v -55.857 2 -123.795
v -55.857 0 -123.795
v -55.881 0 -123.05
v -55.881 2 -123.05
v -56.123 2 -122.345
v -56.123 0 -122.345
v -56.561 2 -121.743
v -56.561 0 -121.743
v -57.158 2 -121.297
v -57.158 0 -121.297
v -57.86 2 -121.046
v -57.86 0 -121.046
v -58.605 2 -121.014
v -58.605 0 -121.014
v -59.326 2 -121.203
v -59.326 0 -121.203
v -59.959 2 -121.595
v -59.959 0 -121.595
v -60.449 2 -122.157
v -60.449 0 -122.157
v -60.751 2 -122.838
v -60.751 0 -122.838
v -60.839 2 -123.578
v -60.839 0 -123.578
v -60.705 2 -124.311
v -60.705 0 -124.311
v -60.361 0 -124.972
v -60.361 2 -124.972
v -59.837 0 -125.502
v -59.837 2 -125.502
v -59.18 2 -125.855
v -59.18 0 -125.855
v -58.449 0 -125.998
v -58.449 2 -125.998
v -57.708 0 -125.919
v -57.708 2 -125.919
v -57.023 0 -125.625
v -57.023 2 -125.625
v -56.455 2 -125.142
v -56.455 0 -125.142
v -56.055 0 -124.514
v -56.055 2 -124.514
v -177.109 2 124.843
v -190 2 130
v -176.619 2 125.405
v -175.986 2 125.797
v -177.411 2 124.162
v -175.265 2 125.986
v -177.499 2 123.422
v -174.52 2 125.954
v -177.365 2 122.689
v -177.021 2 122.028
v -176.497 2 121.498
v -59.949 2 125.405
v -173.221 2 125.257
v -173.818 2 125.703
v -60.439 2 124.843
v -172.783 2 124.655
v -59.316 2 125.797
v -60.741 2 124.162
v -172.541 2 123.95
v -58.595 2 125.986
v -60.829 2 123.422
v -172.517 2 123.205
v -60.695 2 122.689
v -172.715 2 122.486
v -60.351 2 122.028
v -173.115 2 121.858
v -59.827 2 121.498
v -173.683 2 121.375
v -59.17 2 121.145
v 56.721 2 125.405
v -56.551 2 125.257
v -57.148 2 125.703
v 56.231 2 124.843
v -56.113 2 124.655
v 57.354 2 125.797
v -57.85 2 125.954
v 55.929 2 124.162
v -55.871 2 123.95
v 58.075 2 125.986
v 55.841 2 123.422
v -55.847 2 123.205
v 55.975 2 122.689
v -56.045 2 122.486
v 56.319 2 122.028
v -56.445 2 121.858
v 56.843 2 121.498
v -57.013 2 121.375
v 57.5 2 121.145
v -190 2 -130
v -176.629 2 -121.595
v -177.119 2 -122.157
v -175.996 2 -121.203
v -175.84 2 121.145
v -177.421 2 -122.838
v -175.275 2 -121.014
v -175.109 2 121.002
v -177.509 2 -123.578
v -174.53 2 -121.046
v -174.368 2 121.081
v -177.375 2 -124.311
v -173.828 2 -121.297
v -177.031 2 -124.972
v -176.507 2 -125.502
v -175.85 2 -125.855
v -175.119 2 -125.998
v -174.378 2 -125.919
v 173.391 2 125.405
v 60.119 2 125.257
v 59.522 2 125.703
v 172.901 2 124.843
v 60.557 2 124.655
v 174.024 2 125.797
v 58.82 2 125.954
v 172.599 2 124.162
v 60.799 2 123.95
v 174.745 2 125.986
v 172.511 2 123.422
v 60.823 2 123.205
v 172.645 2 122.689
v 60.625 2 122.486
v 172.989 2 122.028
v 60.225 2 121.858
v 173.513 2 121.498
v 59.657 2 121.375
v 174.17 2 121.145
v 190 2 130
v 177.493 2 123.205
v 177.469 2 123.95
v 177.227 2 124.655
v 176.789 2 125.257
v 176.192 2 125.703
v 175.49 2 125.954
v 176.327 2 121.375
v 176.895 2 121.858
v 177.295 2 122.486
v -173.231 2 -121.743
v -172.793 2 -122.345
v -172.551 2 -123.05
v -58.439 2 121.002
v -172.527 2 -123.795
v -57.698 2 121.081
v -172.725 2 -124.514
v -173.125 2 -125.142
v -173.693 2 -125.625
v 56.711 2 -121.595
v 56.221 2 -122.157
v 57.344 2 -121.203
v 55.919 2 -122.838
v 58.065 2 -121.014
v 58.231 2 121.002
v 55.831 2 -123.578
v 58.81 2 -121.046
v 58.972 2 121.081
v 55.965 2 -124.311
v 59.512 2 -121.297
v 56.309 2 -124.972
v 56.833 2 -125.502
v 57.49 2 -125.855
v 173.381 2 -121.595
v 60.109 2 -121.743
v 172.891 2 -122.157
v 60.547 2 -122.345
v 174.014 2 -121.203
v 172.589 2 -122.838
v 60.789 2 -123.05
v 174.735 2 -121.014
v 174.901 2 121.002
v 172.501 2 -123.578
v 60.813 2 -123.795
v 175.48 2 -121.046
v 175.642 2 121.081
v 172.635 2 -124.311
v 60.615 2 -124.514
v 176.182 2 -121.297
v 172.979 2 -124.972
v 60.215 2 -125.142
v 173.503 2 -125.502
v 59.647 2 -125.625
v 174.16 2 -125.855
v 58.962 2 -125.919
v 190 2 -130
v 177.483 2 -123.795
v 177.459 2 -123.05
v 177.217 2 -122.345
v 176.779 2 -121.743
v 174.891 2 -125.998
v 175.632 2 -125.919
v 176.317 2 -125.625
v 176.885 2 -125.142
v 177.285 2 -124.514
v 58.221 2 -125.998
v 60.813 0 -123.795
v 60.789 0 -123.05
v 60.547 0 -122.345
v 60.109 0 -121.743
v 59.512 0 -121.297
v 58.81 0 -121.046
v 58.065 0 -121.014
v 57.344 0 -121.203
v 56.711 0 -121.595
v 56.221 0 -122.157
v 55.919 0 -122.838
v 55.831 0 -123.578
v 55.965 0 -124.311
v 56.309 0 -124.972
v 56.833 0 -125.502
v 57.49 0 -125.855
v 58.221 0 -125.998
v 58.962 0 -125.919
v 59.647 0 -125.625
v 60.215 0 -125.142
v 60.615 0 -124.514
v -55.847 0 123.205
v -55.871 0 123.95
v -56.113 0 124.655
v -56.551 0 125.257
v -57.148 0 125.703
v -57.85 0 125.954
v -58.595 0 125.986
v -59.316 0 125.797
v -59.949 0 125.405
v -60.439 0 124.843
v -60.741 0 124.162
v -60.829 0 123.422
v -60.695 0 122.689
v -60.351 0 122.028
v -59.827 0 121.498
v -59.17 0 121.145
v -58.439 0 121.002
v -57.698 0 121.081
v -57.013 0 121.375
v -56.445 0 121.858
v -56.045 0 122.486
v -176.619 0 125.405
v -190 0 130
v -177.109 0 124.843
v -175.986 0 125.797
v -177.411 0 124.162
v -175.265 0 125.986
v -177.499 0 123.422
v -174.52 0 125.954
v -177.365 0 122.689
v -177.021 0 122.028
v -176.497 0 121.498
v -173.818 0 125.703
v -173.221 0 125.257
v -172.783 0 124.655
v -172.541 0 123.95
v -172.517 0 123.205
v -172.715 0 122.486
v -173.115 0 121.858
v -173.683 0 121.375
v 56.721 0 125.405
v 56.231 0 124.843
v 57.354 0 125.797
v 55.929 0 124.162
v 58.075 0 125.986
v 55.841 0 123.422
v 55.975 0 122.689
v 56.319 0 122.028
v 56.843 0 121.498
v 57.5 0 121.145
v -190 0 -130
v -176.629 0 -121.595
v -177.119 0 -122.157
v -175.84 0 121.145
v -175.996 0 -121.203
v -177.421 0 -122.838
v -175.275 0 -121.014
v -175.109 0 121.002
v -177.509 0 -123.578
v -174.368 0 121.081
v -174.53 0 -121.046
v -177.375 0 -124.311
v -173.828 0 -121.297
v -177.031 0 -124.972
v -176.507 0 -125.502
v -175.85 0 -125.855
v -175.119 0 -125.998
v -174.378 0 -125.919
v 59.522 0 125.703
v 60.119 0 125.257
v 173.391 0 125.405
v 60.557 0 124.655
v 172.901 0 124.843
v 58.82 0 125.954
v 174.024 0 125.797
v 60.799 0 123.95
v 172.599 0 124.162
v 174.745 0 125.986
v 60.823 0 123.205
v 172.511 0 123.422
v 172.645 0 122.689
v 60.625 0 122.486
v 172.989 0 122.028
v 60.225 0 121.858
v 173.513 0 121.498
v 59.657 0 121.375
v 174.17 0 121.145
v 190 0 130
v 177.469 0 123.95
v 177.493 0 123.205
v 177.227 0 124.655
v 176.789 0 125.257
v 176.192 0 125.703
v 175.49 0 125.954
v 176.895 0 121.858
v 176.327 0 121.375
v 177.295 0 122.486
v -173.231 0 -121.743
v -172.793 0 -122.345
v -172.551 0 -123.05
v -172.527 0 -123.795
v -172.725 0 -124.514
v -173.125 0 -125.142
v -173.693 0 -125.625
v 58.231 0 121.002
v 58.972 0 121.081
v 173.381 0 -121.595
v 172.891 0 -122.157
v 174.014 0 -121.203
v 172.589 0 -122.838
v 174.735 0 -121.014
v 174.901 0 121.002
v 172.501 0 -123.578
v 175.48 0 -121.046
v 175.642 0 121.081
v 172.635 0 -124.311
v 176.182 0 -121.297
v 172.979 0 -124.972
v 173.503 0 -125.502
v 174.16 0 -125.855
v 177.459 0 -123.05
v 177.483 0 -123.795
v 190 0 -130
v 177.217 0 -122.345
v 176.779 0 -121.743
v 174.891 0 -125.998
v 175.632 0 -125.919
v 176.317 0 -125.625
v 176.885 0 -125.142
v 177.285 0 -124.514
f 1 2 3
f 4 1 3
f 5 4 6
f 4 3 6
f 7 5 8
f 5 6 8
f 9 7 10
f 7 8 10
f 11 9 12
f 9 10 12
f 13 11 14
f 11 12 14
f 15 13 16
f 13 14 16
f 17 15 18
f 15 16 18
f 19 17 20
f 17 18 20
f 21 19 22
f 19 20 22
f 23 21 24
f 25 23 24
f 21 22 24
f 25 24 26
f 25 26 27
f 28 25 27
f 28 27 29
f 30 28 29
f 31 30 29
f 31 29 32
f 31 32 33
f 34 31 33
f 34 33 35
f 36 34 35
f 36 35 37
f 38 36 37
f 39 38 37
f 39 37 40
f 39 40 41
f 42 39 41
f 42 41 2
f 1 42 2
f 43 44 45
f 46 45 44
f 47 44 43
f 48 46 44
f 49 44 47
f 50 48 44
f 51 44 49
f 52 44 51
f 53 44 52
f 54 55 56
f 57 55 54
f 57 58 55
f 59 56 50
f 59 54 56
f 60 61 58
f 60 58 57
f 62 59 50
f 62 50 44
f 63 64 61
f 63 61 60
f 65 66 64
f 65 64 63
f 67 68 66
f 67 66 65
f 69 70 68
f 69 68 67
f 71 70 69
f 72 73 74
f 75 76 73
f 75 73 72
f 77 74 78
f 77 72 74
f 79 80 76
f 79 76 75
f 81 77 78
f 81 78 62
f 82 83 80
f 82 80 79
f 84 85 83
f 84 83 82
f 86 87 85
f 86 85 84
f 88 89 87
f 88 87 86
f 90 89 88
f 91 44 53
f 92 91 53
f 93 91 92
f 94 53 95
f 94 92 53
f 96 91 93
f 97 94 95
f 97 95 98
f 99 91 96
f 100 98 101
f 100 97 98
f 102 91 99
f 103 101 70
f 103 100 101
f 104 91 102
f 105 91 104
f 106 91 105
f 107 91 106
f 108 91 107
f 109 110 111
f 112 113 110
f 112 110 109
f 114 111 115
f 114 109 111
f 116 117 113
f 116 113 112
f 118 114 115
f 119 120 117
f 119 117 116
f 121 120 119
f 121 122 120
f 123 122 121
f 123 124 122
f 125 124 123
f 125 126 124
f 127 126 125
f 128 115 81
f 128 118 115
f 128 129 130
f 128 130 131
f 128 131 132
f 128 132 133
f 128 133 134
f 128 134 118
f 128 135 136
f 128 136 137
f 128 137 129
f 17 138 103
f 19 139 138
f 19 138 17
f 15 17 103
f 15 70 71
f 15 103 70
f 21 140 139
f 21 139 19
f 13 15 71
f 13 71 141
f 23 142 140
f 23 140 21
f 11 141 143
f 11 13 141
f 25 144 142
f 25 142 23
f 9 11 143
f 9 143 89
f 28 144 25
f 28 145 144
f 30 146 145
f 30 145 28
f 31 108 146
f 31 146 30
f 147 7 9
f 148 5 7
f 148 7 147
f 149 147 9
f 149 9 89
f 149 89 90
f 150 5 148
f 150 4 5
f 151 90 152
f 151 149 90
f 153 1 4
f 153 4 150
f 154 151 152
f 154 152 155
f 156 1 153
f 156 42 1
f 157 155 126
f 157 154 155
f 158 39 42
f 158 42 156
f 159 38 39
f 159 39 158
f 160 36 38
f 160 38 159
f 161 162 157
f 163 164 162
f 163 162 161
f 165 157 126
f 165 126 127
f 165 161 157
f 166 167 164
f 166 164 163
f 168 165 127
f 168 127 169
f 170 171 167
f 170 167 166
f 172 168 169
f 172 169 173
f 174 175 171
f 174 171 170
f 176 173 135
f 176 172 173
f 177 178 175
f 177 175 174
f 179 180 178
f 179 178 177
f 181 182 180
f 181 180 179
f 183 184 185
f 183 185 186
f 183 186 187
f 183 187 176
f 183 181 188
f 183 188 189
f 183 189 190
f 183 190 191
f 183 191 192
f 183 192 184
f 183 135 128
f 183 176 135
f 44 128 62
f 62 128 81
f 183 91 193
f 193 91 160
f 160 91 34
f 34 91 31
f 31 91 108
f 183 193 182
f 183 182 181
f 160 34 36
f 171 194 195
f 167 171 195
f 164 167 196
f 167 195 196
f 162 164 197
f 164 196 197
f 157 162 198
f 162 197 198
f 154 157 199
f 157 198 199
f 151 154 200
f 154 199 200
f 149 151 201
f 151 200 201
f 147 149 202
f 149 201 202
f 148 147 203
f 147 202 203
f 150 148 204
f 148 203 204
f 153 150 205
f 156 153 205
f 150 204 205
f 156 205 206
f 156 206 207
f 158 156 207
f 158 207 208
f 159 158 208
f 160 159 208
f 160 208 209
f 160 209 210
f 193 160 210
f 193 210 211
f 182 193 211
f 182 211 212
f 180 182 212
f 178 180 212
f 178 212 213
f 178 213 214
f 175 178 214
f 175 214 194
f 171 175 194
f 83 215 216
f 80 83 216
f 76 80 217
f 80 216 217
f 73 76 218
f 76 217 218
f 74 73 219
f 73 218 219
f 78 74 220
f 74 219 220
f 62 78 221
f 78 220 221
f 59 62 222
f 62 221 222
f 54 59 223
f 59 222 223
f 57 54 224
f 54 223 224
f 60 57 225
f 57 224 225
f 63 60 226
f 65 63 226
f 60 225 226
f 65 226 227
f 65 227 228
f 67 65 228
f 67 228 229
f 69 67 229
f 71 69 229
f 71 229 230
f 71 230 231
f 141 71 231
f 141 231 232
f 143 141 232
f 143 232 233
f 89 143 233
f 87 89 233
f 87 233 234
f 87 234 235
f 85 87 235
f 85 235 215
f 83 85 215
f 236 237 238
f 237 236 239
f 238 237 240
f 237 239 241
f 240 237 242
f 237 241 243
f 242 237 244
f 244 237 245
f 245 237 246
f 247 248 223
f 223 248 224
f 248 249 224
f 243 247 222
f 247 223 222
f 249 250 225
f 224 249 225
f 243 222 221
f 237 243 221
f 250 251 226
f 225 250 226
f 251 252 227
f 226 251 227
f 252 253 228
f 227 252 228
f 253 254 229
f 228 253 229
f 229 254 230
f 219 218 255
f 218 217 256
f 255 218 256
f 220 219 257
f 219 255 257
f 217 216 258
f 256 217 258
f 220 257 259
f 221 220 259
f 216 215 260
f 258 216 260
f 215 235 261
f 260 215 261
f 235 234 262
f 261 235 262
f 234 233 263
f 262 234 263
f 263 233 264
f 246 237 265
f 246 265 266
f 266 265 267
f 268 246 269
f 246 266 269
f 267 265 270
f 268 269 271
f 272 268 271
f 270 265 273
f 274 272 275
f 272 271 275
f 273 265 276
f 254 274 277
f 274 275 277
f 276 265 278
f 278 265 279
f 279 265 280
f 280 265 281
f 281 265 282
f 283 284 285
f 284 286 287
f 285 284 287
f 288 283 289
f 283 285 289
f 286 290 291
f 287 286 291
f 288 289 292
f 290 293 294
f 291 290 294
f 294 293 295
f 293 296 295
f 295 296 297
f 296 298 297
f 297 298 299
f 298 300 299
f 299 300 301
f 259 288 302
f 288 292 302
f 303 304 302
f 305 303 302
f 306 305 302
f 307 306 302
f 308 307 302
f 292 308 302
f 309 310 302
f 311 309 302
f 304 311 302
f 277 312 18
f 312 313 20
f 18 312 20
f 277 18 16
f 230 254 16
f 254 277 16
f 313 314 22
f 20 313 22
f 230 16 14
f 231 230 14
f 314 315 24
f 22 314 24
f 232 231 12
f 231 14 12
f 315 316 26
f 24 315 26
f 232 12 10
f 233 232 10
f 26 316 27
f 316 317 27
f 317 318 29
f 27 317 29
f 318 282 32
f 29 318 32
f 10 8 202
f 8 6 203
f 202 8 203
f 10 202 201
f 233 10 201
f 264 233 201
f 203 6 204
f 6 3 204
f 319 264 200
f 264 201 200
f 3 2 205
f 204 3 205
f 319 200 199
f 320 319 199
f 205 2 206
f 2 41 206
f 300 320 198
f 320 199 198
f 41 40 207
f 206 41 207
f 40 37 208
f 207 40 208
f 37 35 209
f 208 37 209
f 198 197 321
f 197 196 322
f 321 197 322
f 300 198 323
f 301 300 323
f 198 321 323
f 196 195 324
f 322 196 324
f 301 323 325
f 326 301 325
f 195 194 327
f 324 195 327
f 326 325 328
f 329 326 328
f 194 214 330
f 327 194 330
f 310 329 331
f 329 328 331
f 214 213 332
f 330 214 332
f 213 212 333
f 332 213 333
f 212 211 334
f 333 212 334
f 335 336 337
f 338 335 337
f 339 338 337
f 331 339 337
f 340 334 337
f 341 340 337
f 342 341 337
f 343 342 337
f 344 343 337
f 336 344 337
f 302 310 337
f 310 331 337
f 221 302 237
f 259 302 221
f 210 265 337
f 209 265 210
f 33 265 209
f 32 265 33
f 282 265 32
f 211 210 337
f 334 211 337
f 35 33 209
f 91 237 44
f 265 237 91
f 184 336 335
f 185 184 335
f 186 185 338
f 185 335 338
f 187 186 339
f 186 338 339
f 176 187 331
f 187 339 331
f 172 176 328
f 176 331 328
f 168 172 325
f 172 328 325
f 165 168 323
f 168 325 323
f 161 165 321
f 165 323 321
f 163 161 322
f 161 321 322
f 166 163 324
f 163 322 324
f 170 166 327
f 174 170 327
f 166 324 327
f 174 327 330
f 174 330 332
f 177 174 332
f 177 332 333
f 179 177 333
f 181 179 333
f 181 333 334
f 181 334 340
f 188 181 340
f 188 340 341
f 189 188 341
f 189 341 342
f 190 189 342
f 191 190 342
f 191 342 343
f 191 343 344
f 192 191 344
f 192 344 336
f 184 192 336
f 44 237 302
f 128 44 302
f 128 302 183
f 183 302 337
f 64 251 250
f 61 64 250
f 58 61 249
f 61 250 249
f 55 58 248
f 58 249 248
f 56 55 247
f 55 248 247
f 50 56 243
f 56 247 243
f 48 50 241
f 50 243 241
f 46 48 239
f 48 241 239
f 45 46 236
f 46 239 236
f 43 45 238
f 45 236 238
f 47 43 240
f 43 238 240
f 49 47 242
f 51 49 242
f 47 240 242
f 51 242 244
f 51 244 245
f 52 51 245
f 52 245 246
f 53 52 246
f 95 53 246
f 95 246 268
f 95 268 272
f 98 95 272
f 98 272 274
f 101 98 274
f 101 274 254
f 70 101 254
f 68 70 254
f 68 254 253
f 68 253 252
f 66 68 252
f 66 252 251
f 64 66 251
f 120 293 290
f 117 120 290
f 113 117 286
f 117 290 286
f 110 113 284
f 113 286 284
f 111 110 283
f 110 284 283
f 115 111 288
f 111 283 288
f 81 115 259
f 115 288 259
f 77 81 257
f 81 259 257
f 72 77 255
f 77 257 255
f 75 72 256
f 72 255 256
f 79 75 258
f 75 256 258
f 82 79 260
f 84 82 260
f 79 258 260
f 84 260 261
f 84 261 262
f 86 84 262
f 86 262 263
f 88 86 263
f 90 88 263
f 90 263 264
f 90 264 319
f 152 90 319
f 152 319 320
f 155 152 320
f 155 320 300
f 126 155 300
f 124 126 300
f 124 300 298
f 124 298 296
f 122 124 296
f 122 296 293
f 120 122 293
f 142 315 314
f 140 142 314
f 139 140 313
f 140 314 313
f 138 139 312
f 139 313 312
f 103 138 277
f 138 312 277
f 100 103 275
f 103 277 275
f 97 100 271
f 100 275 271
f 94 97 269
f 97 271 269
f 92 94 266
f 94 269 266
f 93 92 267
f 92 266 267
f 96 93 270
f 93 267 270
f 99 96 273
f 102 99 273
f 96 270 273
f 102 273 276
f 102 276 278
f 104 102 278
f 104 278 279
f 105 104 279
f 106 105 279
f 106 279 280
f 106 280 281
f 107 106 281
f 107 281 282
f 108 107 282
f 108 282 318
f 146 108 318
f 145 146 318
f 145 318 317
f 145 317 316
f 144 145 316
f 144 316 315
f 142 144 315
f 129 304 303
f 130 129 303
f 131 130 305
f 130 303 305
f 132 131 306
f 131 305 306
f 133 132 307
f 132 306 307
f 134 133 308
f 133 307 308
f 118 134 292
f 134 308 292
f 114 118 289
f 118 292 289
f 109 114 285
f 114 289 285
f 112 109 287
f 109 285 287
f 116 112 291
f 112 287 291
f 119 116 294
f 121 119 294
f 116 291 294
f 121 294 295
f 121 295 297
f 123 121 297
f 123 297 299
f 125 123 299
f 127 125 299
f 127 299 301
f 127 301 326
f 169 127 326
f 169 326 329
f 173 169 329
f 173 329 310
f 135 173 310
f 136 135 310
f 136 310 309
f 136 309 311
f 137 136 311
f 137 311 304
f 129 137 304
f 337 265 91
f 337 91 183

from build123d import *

# Parameters (mm, degrees)
SKETCH_1_W      = 380
SKETCH_1_H      = 260
EXTRUDE_1_DEPTH = 2
MM_1_D          = 5
MM_2_D          = 5


with BuildPart() as part:
    # 草图1 → 凸台-拉伸1 (new body)
    with BuildSketch(Plane(origin=(0, 0, 0), x_dir=(1, 0, 0), z_dir=(0, 1, 0))):
        Rectangle(SKETCH_1_W, SKETCH_1_H)
    extrude(amount=EXTRUDE_1_DEPTH)

    # 大小mm 暗销孔1 (through all)
    with Locations(Plane(origin=(86.042395626, 220, 442.05931397), x_dir=(-0.9930068269996722, 0, 0.11805694190534984), z_dir=(0, 1, 0))):
        with Locations((192.458607988, -592.42330735), (76.604501482, -578.649603938), (-39.249605024, -564.875900526), (-155.10371153, -551.102197114), (-125.953576947, -305.828330275), (-10.099470441, -319.602033687), (105.754636065, -333.375737099), (221.608742571, -347.149440512)):
            Hole(MM_1_D / 2)

    # 大小mm 暗销孔2 (through all)
    with Locations(Plane(origin=(86.042395626, 2, 442.05931397), x_dir=(-0.9930068269996722, 0, 0.11805694190534984), z_dir=(0, 1, 0))):
        with Locations((192.458607988, -592.42330735), (76.604501482, -578.649603938), (-39.249605024, -564.875900526), (-155.10371153, -551.102197114), (-125.953576947, -305.828330275), (-10.099470441, -319.602033687), (105.754636065, -333.375737099), (221.608742571, -347.149440512)):
            Hole(MM_2_D / 2)


solid = part.part
